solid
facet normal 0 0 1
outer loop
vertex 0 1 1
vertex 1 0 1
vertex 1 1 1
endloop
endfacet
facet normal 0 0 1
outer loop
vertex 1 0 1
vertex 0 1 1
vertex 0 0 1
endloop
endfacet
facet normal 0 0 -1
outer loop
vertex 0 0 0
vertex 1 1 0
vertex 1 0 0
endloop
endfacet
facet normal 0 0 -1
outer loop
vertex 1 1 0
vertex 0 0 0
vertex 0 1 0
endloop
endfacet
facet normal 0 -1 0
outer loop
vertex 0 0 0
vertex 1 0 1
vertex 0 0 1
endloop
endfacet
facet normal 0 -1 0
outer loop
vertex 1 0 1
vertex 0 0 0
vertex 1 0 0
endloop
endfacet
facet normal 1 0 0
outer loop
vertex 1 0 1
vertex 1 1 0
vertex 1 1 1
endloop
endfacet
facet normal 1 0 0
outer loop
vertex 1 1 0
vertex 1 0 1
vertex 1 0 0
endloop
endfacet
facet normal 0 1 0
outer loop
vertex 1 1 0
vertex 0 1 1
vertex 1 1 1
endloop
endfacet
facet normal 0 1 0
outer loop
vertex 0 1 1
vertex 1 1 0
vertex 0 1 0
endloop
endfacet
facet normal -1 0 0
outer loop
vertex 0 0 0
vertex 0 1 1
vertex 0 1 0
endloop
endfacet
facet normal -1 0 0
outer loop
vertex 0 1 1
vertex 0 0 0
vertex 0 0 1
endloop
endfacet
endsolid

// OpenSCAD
// file: lib/params.scad
// Common Mini16 parameters (mm). The whole design depends on these values.

// ---------- Printing ----------
CL   = 0.4;   // fit clearance between parts (0.3-0.4 depending on the printer)
GAP  = 1.0;   // minimum gap between parts that move relative to each other
T    = 3.0;   // structural arms and plates (PETG, 4 perimeters with a 0.4 nozzle = 1.6 mm + infill)
TF   = 2.0;   // fixed plates resting on the servo face: they must be thinner than how far
              // the disc sticks out (2.6 mm) so they do not rub the arm rotating on top

// ---------- Feetech STS3215 servo (official Waveshare/Feetech "SCS215" drawing) ----------
S_SHORT  = 10.11;  // from the axis to the short end
S_LONG   = 35.11;  // from the axis to the long end (45.22 total)
S_W      = 24.72;  // width
S_CASE   = 32.0;   // case thickness (between the faces with discs)
S_DISC_D = 19.2;   // diameter of the discs (output and passive)
S_DISC_Z = 37.25 / 2;  // outer face of each disc from the mid-plane
S_HORN_R = 7.0;    // radius of the disc's 4 M2 hole circle
M2_HOLE  = 2.4;    // clearance hole for an M2 screw
HORN_CENTER = 6.5; // clearance for the head of the disc's central M3 screw
// M2 case holes (on both faces), measured from the axis along the body.
// Output face: 8.3 and 32.75; passive face: 8.3 and 29.0. All three are drilled on both faces
// so the parts work on the left leg and on the right one (mirrored).
S_CASE_HOLES_X = [8.3, 29.0, 32.75];
S_CASE_HOLE_Y  = 10.25;
S_CORNER_R = sqrt(S_SHORT * S_SHORT + (S_W / 2) * (S_W / 2));  // 16.0: corner of the short side

// ---------- Leg: distances between axes (passed to the simulation model) ----------
R_CB    = S_CORNER_R + GAP;          // inner radius of the crossbar of each "U"
ARM_R   = 11.0;                      // radius of the rounded end of the arms (covers the disc)
D_YAW_ROLL   = T + R_CB + 5;         // yaw servo disc face -> roll axis
                                     // (+5 mm: the roll servo, lying outwards, can tilt ±29°)
D_ROLL_PITCH = S_W / 2 + 3.5 + S_W / 2;   // roll axis -> pitch axis (roll servo above the pitch servo)
D_THIGH = R_CB + T + GAP + S_W / 2;  // hip pitch axis -> knee axis
// Ankle pitch servo in the shin:
//   "fwd": lying forwards -> short shin (33 mm); the knee reaches ~83°
//   "up":  standing along the shin -> 56 mm shin; the knee reaches ~100°
SHIN_SERVO = "fwd";
D_SHIN  = SHIN_SERVO == "up" ? R_CB + T + GAP + S_LONG : R_CB + T + GAP + S_W / 2;
D_ANKLE = D_THIGH;                   // ankle pitch axis -> ankle roll axis
FOOT_CLEAR = 27.5;                   // ankle roll axis -> top face of the foot plate
                                     // (lets the foot tilt ±29° without touching the servo, which sticks out outwards)
PLATE_T = 3.0;                       // foot plate (PETG)
SOLE_T  = 4.0;                       // sole (TPU 95A)
D_SOLE  = FOOT_CLEAR + PLATE_T + SOLE_T;   // ankle roll axis -> sole

HIP_Y   = 30.0;                      // lateral offset of each leg from the center
FOOT_X0 = -38;  FOOT_X1 = 48;        // foot length (8.6 cm), x forward
FOOT_HW = 22;                        // half width of the foot (4.4 cm)
ROCKER_R = 6;                        // radius of the curved sole at the toe, heel and sides

// ---------- Foot contact sensors (SS-10 type microswitch: MEASURE the one you buy) ----------
SW_L = 13.0; SW_W = 6.0; SW_H = 6.5;   // body
SW_PIN = 2.0;                          // mounting pins (spacing SW_PIN_DX)
SW_PIN_DX = 6.5;
SW_X = [FOOT_X1 - 11, FOOT_X0 + 11];   // toe and heel

// ---------- M3 brass inserts ----------
INSERT_D = 4.0;   // hole for an M3 insert (check with the insert manufacturer)
INSERT_L = 5.0;
INSERT_BOSS = 7.5;
M3_HOLE = 3.4;

$fn = 48;
// main file
// Prints the parameters used by build_mjcf.py (single source of truth: lib/params.scad).
include <lib/params.scad>
echo("S_DISC_Z", S_DISC_Z);
echo("S_CASE", S_CASE);
echo("S_W", S_W);
echo("S_SHORT", S_SHORT);
echo("S_LONG", S_LONG);
echo("D_YAW_ROLL", D_YAW_ROLL);
echo("D_ROLL_PITCH", D_ROLL_PITCH);
echo("D_THIGH", D_THIGH);
echo("D_SHIN", D_SHIN);
echo("D_ANKLE", D_ANKLE);
echo("D_SOLE", D_SOLE);
echo("FOOT_CLEAR", FOOT_CLEAR);
echo("PLATE_T", PLATE_T);
echo("SOLE_T", SOLE_T);
echo("HIP_Y", HIP_Y);
echo("FOOT_X0", FOOT_X0);
echo("FOOT_X1", FOOT_X1);
echo("FOOT_HW", FOOT_HW);
echo("SW_X0", SW_X[0]);
echo("SW_X1", SW_X[1]);
echo("SHIN_UP", SHIN_SERVO == "up" ? 1 : 0);
cube(1);
